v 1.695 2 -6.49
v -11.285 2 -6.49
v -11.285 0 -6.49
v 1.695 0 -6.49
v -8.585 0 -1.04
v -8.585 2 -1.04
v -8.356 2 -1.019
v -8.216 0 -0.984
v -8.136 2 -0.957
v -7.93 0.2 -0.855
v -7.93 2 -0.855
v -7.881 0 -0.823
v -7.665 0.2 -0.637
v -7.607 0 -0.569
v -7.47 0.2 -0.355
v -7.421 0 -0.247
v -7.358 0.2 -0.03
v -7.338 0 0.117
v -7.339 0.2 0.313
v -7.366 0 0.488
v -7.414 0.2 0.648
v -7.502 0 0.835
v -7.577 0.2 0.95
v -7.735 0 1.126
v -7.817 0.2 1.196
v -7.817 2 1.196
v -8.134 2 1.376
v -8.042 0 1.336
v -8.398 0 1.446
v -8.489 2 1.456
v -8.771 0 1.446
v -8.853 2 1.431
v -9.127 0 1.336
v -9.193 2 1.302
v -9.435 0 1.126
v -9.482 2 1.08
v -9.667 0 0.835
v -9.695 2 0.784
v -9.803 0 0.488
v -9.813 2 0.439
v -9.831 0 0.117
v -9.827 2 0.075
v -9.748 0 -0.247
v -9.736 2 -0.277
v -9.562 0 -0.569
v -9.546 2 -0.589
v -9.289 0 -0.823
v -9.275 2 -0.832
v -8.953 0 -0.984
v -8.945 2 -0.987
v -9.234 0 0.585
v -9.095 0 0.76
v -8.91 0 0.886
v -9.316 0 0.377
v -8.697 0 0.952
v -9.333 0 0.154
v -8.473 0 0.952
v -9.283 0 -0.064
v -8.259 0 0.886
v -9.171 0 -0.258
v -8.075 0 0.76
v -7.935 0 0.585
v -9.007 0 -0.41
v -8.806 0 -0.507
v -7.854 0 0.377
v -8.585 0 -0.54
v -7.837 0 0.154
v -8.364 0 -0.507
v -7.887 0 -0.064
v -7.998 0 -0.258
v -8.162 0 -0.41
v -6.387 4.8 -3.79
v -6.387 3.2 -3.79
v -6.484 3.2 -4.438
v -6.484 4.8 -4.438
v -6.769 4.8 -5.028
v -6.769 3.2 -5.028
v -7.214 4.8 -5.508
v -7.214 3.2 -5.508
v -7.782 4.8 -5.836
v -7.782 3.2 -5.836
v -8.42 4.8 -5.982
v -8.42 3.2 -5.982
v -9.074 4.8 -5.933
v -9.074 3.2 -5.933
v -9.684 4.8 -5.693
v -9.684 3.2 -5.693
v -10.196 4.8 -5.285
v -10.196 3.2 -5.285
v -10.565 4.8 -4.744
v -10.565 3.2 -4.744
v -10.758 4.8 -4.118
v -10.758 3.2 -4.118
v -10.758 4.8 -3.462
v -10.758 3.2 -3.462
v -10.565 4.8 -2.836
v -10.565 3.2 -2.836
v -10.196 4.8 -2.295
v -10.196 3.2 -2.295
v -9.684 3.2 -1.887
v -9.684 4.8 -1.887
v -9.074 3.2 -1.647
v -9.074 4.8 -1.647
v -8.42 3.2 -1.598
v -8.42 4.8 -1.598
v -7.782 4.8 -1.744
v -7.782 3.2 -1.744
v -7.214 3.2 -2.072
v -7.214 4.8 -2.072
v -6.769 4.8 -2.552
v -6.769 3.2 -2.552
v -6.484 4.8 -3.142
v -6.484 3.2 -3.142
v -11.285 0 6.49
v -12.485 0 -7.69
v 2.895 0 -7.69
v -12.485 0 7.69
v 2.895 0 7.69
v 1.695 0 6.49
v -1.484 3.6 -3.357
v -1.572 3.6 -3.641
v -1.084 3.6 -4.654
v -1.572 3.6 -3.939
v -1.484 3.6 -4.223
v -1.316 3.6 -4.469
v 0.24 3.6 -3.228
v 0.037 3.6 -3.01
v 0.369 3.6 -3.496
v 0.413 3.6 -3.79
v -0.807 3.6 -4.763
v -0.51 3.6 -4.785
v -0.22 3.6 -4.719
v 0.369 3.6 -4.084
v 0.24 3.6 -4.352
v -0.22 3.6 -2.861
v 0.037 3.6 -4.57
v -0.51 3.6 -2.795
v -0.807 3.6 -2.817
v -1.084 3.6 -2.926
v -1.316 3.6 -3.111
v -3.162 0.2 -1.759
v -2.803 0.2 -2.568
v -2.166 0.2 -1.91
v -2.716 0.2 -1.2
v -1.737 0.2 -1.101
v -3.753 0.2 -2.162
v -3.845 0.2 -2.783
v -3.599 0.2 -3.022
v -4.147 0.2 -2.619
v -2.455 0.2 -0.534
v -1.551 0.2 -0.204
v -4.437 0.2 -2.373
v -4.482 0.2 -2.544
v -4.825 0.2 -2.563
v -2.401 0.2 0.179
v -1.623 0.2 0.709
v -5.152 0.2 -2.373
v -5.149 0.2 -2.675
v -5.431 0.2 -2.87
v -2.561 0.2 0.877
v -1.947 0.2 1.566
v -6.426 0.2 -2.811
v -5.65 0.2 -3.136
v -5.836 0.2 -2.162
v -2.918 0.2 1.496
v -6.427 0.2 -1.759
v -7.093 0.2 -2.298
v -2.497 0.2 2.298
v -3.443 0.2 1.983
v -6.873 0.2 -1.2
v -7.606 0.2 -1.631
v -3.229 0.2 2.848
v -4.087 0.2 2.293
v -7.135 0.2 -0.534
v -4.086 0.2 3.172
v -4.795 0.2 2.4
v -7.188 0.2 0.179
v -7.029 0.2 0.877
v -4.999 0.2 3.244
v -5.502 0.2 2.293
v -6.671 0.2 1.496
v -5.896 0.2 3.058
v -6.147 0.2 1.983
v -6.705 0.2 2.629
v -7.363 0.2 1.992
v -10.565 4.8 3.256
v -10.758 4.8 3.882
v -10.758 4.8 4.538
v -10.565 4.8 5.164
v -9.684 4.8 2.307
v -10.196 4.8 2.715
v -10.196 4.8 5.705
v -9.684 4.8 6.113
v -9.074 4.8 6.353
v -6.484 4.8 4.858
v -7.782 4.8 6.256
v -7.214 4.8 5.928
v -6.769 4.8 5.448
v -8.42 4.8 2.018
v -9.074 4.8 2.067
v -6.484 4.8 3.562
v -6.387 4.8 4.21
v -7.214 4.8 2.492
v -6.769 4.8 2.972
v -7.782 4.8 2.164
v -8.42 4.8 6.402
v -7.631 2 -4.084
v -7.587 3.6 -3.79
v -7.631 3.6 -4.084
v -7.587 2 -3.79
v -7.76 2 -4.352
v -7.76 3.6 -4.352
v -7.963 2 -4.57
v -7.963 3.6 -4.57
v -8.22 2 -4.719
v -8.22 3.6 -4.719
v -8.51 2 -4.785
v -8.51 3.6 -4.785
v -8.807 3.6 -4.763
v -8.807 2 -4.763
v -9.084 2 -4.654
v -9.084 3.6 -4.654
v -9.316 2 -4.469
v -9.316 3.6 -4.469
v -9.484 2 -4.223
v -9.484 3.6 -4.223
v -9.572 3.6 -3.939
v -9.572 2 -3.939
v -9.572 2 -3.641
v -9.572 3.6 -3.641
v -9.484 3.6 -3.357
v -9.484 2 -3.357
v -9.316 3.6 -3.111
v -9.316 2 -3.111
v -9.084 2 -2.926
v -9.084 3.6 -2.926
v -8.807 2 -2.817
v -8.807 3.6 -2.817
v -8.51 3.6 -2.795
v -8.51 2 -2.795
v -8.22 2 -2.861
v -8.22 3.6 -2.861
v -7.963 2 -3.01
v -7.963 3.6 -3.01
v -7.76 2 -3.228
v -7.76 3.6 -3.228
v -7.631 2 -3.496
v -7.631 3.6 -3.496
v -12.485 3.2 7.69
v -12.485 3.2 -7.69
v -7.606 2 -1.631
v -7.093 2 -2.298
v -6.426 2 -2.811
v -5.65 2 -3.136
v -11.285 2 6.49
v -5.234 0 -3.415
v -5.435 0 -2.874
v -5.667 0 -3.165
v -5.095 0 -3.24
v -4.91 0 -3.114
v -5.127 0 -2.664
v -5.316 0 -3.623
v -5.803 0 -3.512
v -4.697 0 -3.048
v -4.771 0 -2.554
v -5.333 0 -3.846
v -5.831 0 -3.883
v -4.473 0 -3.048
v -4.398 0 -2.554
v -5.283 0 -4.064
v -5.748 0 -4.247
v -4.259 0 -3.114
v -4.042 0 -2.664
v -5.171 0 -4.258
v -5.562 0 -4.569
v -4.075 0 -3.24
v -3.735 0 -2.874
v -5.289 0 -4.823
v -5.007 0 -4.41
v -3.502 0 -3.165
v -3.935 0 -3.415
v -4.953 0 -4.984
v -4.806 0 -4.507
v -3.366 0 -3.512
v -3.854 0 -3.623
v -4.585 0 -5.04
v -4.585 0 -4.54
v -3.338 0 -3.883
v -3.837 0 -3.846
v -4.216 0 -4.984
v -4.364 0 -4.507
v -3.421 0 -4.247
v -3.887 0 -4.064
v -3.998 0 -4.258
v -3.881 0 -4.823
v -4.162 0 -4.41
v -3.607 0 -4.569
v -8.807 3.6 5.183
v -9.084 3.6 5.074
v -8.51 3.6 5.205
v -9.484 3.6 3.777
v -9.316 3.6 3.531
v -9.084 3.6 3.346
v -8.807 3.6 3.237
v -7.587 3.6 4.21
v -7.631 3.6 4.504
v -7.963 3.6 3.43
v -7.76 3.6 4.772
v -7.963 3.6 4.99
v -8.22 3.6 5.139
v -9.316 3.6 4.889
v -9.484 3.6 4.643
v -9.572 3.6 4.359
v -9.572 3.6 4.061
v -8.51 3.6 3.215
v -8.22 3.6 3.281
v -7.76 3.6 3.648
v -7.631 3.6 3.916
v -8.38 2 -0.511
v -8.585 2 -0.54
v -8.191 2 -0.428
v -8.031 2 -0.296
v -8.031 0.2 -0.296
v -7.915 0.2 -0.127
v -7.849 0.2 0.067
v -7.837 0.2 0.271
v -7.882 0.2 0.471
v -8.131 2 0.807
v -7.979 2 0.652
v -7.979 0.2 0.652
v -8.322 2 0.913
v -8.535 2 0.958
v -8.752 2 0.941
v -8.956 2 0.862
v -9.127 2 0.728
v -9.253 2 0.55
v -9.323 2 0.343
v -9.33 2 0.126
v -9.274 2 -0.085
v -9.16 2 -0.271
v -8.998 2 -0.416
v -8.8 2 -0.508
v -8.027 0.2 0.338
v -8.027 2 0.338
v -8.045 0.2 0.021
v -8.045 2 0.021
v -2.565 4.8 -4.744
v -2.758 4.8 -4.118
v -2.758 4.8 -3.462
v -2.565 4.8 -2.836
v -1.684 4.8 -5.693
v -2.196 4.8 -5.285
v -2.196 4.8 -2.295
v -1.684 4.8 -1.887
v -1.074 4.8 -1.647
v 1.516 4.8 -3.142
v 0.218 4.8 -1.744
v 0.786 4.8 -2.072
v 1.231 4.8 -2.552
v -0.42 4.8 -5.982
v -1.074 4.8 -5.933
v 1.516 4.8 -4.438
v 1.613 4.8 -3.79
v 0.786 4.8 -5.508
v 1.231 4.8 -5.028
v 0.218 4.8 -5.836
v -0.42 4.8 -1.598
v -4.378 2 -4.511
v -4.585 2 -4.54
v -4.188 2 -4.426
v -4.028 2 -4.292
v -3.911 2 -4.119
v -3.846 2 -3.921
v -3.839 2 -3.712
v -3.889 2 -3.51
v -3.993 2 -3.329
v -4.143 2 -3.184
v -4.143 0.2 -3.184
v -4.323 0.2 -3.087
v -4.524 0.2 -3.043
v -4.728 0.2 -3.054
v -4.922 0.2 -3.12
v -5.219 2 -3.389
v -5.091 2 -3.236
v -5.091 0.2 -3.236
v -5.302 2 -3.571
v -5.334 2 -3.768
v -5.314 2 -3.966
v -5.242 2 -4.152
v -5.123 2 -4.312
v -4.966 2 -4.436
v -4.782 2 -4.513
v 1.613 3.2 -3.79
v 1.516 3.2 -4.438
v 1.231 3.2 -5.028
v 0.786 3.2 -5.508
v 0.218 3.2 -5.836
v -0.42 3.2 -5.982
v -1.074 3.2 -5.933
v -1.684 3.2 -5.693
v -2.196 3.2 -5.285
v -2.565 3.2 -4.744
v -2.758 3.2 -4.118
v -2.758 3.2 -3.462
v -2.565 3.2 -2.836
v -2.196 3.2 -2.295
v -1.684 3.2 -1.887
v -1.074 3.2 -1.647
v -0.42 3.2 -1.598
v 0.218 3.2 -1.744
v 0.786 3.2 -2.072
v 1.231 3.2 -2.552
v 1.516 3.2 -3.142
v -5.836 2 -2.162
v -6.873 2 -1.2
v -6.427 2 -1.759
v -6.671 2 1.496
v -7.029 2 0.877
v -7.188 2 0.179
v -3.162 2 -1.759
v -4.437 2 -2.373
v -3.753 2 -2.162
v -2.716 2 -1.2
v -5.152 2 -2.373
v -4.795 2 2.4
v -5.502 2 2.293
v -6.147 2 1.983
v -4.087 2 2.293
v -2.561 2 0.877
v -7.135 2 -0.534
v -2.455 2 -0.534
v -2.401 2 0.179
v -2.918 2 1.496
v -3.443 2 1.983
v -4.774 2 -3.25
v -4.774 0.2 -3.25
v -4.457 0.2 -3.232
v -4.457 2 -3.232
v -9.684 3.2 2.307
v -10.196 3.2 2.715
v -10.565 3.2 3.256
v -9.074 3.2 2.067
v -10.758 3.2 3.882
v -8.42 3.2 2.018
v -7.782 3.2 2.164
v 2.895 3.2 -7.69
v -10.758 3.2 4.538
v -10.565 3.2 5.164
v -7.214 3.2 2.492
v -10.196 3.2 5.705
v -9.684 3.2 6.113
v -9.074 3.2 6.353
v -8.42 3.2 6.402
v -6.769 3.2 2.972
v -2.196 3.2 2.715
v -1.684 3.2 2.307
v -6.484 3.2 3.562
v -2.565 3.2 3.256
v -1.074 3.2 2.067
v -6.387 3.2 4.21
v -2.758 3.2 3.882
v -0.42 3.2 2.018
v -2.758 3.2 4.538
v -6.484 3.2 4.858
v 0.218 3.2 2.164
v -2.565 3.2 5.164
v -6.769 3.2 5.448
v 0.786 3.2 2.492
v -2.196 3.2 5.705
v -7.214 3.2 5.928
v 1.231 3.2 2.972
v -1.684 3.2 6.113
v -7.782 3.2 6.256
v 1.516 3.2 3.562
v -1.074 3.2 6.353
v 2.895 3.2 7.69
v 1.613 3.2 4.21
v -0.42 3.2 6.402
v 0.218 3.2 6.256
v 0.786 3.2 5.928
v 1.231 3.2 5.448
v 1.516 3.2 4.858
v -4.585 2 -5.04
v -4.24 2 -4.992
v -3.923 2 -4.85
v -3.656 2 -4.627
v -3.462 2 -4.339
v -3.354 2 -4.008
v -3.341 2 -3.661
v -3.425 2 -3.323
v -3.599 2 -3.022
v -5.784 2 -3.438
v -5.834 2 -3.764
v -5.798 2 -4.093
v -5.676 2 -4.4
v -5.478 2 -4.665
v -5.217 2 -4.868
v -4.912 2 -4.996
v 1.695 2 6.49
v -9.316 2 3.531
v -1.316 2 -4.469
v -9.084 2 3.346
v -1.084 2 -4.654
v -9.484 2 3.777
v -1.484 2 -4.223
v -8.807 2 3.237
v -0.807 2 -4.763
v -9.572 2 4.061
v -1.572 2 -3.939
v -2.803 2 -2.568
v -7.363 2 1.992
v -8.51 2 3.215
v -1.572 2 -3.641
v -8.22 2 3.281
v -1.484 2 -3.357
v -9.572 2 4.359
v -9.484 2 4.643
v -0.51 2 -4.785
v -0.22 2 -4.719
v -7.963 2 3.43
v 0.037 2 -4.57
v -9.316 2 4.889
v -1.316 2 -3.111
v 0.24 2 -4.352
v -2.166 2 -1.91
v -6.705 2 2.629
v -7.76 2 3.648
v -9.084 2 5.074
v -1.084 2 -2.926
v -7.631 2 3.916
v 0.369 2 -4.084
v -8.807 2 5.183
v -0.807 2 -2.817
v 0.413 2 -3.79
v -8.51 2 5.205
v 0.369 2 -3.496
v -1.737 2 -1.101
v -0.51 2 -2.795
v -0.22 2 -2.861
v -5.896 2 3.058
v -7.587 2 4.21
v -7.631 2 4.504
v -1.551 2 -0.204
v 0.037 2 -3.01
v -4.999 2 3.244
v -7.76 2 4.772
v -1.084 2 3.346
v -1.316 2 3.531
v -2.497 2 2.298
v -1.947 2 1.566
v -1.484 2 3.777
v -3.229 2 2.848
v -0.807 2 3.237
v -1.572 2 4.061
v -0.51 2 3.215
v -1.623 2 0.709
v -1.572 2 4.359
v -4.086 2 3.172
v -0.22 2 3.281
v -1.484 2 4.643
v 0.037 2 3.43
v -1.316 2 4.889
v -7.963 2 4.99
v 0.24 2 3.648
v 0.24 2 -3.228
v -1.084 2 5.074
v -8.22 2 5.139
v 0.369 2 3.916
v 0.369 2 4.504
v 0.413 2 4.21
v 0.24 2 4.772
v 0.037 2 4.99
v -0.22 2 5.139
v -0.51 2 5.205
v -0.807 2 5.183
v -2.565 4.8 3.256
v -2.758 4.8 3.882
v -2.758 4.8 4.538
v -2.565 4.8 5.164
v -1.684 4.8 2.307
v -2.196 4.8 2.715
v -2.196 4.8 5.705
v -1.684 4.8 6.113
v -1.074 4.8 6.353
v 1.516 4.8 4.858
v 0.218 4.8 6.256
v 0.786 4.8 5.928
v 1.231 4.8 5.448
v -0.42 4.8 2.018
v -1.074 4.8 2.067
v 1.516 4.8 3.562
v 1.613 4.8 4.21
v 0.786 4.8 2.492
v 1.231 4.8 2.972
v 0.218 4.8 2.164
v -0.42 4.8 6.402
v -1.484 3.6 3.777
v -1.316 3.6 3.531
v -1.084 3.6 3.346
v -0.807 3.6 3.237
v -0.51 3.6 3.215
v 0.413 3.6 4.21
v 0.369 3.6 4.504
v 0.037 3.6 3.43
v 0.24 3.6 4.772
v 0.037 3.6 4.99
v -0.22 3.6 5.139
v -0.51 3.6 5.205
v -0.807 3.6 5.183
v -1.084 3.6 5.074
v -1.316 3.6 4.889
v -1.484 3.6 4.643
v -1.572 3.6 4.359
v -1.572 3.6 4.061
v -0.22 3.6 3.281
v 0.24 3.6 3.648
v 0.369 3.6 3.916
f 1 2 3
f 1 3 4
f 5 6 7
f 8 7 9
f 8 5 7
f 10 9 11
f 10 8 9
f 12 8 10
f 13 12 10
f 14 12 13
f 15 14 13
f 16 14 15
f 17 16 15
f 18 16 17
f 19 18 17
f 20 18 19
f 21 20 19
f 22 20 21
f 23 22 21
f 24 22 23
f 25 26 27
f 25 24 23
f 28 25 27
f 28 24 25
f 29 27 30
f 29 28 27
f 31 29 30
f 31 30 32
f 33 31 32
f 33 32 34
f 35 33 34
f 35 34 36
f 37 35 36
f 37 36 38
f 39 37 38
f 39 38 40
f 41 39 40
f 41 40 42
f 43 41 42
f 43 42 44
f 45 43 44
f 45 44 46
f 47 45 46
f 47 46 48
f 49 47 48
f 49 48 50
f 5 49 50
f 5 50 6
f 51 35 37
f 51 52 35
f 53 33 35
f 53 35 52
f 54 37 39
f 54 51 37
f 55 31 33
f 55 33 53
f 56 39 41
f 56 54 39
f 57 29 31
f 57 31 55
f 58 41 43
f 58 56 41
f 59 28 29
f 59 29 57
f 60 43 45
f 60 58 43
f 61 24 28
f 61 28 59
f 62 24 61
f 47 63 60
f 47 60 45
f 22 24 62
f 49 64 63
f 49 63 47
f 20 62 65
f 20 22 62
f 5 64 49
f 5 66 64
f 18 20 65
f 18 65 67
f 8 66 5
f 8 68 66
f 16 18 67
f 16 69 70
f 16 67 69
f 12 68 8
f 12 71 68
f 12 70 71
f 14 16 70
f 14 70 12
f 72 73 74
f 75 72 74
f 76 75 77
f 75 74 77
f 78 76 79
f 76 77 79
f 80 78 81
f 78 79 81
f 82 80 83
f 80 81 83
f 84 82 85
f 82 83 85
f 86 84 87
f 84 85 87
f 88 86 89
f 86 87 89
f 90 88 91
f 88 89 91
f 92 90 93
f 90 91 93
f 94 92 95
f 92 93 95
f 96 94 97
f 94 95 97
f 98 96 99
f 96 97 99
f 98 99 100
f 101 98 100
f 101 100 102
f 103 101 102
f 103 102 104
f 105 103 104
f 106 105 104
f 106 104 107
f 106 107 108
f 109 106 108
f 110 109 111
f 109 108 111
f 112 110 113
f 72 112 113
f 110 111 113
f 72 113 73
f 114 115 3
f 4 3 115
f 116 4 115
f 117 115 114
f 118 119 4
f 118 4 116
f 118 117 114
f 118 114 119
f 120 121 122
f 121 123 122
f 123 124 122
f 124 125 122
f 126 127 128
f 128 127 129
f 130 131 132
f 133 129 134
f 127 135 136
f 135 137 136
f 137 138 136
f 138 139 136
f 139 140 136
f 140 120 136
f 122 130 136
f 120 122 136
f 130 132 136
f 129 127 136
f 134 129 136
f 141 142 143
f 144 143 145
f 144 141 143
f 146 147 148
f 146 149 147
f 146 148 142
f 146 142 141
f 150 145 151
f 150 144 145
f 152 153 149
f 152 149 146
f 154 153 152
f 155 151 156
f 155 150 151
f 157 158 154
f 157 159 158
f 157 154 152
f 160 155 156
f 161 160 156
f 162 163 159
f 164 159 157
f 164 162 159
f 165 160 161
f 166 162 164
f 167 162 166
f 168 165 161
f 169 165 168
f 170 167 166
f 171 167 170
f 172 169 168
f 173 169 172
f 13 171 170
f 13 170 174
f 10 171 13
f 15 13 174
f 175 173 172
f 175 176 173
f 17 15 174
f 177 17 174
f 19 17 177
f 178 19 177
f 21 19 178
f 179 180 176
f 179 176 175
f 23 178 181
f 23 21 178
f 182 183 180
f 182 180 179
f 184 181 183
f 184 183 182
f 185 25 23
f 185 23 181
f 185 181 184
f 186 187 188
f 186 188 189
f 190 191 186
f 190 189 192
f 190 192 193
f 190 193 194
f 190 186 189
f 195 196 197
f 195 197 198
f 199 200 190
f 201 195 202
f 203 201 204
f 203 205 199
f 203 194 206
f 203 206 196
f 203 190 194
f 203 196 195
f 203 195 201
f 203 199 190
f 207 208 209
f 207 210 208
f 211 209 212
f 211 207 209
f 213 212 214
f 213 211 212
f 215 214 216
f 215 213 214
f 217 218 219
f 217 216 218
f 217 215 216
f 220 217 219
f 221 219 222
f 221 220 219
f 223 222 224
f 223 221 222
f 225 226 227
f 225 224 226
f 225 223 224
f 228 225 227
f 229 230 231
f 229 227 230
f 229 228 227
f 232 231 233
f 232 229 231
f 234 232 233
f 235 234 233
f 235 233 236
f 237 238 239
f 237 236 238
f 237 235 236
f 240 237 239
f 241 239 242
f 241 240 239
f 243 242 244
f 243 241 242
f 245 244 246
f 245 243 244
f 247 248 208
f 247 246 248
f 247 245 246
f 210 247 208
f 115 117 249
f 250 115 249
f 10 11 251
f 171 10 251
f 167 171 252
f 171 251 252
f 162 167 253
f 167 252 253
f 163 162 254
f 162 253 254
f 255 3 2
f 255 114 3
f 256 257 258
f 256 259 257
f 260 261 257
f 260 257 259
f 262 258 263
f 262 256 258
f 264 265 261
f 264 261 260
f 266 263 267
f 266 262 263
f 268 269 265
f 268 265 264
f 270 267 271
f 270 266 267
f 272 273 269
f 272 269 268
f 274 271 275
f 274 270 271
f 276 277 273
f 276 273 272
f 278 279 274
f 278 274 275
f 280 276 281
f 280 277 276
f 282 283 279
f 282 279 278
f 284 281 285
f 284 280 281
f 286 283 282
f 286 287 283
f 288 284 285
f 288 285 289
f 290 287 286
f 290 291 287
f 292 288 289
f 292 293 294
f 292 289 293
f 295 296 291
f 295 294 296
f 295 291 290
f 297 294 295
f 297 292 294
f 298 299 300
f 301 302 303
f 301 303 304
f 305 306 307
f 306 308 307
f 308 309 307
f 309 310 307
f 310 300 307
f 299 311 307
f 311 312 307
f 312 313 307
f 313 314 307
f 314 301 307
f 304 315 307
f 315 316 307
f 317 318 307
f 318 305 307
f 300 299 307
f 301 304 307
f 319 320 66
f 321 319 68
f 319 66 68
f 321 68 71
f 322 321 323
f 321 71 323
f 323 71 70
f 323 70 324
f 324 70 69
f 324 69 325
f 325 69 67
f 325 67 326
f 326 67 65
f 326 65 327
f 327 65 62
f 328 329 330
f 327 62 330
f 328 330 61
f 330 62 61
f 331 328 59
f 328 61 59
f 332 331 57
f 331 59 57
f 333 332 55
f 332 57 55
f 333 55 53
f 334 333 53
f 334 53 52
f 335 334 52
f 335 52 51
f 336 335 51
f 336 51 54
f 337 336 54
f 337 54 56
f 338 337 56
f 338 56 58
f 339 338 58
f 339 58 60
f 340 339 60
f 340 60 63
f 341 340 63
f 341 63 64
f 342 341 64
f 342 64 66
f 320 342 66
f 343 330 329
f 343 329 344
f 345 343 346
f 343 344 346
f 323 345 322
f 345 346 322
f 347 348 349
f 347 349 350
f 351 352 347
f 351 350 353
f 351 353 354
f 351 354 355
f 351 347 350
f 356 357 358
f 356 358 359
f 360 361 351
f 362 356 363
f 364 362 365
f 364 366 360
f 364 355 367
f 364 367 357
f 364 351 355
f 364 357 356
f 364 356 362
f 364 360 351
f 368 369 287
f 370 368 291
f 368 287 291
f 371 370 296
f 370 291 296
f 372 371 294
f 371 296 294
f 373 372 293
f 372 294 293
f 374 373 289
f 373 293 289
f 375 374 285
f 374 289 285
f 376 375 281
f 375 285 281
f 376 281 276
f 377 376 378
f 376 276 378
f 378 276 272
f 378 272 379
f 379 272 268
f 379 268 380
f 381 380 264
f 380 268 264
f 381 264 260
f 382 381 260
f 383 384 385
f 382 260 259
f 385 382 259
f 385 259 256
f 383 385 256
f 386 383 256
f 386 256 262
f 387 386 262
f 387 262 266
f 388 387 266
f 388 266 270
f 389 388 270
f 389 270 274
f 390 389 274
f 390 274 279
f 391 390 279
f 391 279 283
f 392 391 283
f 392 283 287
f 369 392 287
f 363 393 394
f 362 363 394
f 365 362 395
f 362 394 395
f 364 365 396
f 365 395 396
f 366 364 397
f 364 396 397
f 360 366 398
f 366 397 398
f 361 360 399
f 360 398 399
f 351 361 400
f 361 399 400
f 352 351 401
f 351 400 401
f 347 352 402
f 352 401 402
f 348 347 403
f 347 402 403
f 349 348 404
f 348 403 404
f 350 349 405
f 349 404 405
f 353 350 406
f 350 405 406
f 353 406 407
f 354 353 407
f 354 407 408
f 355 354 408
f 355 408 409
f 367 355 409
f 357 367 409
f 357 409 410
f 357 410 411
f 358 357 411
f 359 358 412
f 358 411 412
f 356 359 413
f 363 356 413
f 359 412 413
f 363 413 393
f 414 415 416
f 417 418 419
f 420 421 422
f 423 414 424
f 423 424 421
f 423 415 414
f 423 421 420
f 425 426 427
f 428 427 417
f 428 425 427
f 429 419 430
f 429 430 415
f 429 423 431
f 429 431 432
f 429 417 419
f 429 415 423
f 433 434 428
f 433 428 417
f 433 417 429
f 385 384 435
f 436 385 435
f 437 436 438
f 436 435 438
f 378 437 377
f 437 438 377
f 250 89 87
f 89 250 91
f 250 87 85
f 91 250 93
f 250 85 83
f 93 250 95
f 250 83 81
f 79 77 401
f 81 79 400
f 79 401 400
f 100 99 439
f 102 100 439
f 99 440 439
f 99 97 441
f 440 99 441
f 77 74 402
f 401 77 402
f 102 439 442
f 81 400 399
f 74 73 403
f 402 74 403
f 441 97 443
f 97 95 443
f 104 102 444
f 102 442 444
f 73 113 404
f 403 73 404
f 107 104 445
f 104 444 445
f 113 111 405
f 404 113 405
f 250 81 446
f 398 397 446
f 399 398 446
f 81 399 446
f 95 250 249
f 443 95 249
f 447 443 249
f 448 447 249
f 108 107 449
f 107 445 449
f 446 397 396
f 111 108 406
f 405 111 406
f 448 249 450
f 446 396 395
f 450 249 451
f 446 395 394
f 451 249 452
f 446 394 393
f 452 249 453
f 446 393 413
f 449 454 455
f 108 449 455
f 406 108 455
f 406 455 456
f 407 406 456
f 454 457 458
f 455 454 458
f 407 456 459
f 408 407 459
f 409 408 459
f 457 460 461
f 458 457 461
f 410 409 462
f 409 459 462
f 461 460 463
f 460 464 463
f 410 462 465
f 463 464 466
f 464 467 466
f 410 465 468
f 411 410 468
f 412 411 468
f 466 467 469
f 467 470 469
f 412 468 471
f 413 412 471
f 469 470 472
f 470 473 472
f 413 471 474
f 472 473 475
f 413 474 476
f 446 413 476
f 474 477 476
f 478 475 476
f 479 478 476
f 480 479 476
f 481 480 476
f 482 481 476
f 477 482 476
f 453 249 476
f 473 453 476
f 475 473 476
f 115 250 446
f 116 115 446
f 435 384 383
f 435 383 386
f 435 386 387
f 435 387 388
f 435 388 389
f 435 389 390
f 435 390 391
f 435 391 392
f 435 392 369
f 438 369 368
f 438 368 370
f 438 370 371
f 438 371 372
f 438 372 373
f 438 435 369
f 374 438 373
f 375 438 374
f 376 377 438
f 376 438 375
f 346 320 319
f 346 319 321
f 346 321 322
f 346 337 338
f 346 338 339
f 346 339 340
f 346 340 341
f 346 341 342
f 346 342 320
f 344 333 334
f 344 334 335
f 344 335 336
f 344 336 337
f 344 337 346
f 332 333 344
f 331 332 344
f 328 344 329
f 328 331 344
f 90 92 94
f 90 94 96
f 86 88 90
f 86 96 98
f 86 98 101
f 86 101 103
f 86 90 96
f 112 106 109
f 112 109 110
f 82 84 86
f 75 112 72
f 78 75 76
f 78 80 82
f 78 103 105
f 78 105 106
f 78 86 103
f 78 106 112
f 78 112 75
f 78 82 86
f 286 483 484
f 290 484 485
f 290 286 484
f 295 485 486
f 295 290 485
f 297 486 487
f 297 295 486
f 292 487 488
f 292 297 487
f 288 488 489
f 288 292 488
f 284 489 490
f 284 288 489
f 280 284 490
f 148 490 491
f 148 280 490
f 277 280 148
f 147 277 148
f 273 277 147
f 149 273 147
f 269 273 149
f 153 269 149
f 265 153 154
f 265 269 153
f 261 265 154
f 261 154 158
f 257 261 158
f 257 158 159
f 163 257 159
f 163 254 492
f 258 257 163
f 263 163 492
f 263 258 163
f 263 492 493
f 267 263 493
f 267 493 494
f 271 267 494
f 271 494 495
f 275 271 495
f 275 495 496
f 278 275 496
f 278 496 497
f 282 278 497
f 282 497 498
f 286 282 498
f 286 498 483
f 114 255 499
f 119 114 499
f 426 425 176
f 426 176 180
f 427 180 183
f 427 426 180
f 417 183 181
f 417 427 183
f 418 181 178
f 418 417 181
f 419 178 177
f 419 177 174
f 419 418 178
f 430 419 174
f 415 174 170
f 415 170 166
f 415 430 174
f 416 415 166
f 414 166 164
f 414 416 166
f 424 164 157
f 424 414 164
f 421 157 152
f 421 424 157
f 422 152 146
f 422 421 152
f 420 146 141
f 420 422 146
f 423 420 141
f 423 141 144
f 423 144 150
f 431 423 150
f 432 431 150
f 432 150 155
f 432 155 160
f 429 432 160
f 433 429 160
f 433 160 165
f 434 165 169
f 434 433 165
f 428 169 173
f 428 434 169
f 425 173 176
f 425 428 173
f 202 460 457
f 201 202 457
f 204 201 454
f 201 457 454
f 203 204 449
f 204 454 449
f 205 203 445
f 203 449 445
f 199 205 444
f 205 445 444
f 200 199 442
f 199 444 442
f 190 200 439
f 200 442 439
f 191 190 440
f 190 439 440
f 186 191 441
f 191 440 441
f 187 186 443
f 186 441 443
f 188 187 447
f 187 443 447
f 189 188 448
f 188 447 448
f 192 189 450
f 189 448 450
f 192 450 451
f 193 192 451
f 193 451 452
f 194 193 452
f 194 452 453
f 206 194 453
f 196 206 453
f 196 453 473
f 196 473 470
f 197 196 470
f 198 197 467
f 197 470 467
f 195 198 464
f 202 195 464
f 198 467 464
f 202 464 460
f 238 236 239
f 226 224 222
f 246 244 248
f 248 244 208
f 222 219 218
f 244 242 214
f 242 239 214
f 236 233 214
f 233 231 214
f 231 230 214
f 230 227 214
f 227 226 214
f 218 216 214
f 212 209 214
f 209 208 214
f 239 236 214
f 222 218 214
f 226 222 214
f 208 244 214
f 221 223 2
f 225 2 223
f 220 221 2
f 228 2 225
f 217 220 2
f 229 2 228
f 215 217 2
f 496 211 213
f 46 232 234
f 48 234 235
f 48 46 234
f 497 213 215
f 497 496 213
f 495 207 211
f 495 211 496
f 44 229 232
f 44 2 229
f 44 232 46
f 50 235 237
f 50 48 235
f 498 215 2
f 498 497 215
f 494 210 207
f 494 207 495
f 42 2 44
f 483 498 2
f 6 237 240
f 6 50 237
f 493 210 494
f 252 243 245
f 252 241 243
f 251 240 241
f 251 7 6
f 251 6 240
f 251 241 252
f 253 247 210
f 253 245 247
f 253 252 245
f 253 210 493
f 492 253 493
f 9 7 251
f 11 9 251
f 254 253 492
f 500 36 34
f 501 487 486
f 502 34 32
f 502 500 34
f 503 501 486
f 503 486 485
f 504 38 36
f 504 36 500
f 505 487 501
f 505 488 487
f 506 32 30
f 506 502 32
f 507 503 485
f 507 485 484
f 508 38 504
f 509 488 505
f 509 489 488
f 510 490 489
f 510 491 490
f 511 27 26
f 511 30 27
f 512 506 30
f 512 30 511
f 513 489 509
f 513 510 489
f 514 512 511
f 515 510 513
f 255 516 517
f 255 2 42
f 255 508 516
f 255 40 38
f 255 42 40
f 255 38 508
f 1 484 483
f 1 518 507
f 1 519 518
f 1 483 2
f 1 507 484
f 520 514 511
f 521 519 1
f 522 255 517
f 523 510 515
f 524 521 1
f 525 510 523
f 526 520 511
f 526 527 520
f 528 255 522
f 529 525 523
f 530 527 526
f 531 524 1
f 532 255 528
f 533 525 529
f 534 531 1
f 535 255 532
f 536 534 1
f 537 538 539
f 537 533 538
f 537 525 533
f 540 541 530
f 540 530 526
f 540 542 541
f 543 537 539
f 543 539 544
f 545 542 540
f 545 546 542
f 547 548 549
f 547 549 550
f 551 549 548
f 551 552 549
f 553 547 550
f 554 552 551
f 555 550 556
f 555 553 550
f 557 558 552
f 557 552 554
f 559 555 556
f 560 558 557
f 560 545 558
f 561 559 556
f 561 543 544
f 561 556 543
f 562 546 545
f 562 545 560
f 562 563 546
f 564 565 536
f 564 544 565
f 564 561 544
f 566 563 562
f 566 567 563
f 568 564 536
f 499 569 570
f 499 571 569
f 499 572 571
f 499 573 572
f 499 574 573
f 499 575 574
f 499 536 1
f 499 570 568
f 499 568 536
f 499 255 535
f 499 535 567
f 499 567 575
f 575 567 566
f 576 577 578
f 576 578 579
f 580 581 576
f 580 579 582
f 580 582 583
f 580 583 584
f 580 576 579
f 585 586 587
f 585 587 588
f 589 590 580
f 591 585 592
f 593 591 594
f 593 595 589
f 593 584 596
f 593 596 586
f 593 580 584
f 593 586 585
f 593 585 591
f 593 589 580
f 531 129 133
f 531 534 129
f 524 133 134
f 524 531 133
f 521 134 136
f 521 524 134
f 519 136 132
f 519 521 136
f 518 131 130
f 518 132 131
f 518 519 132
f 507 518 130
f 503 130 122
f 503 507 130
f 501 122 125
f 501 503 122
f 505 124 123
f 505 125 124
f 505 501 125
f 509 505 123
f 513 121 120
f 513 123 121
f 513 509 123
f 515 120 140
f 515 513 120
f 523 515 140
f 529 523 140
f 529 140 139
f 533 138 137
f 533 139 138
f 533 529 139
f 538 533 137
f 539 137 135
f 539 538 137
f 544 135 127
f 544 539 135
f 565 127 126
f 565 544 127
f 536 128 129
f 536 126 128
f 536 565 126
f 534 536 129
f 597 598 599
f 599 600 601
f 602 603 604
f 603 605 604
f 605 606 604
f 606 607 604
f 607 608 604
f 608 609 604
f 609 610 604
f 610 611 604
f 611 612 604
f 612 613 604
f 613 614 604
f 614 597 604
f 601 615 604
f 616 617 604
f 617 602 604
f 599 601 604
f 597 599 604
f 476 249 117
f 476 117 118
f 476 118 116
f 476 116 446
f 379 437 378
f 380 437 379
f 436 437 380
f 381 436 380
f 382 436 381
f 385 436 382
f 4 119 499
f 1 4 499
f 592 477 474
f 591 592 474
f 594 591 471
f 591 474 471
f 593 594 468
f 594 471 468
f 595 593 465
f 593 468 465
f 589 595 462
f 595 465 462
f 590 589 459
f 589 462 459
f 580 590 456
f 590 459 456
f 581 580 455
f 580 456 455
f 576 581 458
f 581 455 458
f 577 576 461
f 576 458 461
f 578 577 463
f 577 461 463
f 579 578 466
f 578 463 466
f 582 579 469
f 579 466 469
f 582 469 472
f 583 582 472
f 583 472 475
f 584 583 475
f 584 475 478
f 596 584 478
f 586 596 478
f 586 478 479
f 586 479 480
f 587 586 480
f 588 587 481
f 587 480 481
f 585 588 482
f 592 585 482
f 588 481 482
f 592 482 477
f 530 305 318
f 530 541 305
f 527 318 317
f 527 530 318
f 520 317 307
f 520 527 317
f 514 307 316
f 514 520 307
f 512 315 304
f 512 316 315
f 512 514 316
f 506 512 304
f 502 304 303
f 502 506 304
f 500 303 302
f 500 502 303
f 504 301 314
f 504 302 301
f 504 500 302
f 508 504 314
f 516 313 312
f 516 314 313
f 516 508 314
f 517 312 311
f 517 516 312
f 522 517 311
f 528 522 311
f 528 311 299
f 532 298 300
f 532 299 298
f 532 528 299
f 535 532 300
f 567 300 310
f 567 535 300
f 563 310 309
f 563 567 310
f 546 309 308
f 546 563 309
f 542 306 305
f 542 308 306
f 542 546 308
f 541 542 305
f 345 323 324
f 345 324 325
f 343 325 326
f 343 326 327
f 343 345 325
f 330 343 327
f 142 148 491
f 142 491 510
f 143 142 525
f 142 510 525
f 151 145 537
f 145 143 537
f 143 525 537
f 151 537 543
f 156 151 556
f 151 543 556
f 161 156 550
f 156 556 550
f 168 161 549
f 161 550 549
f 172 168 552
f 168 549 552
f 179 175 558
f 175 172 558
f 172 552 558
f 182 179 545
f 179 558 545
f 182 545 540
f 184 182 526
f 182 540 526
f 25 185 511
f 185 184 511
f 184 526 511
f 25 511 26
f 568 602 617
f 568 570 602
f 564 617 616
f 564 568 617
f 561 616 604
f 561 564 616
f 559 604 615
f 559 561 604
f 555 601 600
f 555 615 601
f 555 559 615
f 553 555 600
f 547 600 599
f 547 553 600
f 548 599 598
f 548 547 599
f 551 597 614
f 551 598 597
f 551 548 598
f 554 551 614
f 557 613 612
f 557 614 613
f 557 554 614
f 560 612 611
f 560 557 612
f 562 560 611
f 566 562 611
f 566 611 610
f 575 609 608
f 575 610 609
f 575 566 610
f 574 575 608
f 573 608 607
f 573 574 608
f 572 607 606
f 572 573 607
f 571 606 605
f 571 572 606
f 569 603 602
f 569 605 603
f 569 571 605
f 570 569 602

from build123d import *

# Parameters (mm, degrees)
BASEFRAMESKETCH_W           = 15.38
BASEFRAMESKETCH_H           = 3.2
BASEFRAME_DEPTH             = 7.69
STUDSSKETCH_R               = 2.197938665
STUDS_DEPTH                 = 1.6
MAINSTUDSPATTERN_COUNT      = 2
MAINSTUDSPATTERN_PITCH      = 8
MAINSTUDSPATTERN_COUNT_DIR2 = 2
MAINSTUDSPATTERN_PITCH_DIR2 = 8
MAINBASESHELL_T             = -1.2
UNDERCIRCLESKETCH_R         = 3.25
UNDERCIRCLESKETCH_R_2       = 2.4
UNDERCIRCLEEXTRUDE_DEPTH    = 1.8
SMALLUNDERSIDEHOLEX_REACH   = 17.429
HOLEXSKETCH_R               = 1.25
HOLEXSKETCH_R_2             = 0.75
SMALLUNDERSIDEHOLEY_REACH   = 17.429
HOLEYSKETCH_R               = 1.25
HOLEYSKETCH_R_2             = 0.75


with BuildPart() as part:
    # BaseFrameSketch → BaseFrame (new, symmetric)
    with BuildSketch(Plane.XY):
        with Locations((-4.794729064, 1.6)):
            Rectangle(BASEFRAMESKETCH_W, BASEFRAMESKETCH_H)
    extrude(amount=BASEFRAME_DEPTH, both=True)

    # StudsSketch → Studs (add)
    with BuildSketch(Plane(origin=(0, 3.2, 0), x_dir=(1, 0, 0), z_dir=(0, 1, 0))):
        with Locations((-8.584729064, 3.79)):
            Circle(STUDSSKETCH_R)
    studs = extrude(amount=STUDS_DEPTH)

    # MainStudsPattern: Studs 2 × 2
    with Locations(*[(i * MAINSTUDSPATTERN_PITCH, 0, j * MAINSTUDSPATTERN_PITCH_DIR2) for i in range(MAINSTUDSPATTERN_COUNT) for j in range(MAINSTUDSPATTERN_COUNT_DIR2) if (i, j) != (0, 0)]):
        add(studs)

    # MainBaseShell
    mainbaseshell_openings = [part.faces().sort_by_distance(p)[0] for p in [
        (-4.794729064, 0, 0),
    ]]
    offset(amount=MAINBASESHELL_T, openings=mainbaseshell_openings, kind=Kind.INTERSECTION)

    # UnderCircleSketch → UnderCircleExtrude (add)
    with BuildSketch(Plane(origin=(0, 2, 0), x_dir=(-1, 0, 0), z_dir=(0, -1, 0))):
        with Locations(Location((4.794729064, 0, 0), (0, 0, 270))):
            Circle(UNDERCIRCLESKETCH_R)
        with Locations(Location((4.794729064, 0, 0), (0, 0, 270))):
            Circle(UNDERCIRCLESKETCH_R_2, mode=Mode.SUBTRACT)
    extrude(amount=UNDERCIRCLEEXTRUDE_DEPTH)

    # HoleXSketch → SmallUnderSideHoleX (add, up to next)
    with BuildSketch(Plane(origin=(0, 0, 0), x_dir=(-1, 0, 0), z_dir=(0, -1, 0)), mode=Mode.PRIVATE) as smallundersideholex_sk1:
        with Locations(Location((4.584729064, 3.79, 0), (0, 0, 90))):
            Circle(HOLEXSKETCH_R)
        with Locations(Location((4.584729064, 3.79, 0), (0, 0, 90))):
            Circle(HOLEXSKETCH_R_2, mode=Mode.SUBTRACT)
    smallundersideholex_tool1 = extrude(smallundersideholex_sk1.sketch, amount=-SMALLUNDERSIDEHOLEX_REACH, mode=Mode.PRIVATE) - part.part
    add(smallundersideholex_tool1.solids().sort_by_distance((-4.584729, 0, -2.575355))[0])

    # HoleYSketch → SmallUnderSideHoleY (add, up to next)
    with BuildSketch(Plane(origin=(0, 0, 0), x_dir=(-1, 0, 0), z_dir=(0, -1, 0)), mode=Mode.PRIVATE) as smallundersideholey_sk1:
        with Locations(Location((8.584729064, -0.21, 0), (0, 0, 90))):
            Circle(HOLEYSKETCH_R)
        with Locations(Location((8.584729064, -0.21, 0), (0, 0, 90))):
            Circle(HOLEYSKETCH_R_2, mode=Mode.SUBTRACT)
    smallundersideholey_tool1 = extrude(smallundersideholey_sk1.sketch, amount=-SMALLUNDERSIDEHOLEY_REACH, mode=Mode.PRIVATE) - part.part
    add(smallundersideholey_tool1.solids().sort_by_distance((-8.584729, 0, 1.424645))[0])


solid = part.part
